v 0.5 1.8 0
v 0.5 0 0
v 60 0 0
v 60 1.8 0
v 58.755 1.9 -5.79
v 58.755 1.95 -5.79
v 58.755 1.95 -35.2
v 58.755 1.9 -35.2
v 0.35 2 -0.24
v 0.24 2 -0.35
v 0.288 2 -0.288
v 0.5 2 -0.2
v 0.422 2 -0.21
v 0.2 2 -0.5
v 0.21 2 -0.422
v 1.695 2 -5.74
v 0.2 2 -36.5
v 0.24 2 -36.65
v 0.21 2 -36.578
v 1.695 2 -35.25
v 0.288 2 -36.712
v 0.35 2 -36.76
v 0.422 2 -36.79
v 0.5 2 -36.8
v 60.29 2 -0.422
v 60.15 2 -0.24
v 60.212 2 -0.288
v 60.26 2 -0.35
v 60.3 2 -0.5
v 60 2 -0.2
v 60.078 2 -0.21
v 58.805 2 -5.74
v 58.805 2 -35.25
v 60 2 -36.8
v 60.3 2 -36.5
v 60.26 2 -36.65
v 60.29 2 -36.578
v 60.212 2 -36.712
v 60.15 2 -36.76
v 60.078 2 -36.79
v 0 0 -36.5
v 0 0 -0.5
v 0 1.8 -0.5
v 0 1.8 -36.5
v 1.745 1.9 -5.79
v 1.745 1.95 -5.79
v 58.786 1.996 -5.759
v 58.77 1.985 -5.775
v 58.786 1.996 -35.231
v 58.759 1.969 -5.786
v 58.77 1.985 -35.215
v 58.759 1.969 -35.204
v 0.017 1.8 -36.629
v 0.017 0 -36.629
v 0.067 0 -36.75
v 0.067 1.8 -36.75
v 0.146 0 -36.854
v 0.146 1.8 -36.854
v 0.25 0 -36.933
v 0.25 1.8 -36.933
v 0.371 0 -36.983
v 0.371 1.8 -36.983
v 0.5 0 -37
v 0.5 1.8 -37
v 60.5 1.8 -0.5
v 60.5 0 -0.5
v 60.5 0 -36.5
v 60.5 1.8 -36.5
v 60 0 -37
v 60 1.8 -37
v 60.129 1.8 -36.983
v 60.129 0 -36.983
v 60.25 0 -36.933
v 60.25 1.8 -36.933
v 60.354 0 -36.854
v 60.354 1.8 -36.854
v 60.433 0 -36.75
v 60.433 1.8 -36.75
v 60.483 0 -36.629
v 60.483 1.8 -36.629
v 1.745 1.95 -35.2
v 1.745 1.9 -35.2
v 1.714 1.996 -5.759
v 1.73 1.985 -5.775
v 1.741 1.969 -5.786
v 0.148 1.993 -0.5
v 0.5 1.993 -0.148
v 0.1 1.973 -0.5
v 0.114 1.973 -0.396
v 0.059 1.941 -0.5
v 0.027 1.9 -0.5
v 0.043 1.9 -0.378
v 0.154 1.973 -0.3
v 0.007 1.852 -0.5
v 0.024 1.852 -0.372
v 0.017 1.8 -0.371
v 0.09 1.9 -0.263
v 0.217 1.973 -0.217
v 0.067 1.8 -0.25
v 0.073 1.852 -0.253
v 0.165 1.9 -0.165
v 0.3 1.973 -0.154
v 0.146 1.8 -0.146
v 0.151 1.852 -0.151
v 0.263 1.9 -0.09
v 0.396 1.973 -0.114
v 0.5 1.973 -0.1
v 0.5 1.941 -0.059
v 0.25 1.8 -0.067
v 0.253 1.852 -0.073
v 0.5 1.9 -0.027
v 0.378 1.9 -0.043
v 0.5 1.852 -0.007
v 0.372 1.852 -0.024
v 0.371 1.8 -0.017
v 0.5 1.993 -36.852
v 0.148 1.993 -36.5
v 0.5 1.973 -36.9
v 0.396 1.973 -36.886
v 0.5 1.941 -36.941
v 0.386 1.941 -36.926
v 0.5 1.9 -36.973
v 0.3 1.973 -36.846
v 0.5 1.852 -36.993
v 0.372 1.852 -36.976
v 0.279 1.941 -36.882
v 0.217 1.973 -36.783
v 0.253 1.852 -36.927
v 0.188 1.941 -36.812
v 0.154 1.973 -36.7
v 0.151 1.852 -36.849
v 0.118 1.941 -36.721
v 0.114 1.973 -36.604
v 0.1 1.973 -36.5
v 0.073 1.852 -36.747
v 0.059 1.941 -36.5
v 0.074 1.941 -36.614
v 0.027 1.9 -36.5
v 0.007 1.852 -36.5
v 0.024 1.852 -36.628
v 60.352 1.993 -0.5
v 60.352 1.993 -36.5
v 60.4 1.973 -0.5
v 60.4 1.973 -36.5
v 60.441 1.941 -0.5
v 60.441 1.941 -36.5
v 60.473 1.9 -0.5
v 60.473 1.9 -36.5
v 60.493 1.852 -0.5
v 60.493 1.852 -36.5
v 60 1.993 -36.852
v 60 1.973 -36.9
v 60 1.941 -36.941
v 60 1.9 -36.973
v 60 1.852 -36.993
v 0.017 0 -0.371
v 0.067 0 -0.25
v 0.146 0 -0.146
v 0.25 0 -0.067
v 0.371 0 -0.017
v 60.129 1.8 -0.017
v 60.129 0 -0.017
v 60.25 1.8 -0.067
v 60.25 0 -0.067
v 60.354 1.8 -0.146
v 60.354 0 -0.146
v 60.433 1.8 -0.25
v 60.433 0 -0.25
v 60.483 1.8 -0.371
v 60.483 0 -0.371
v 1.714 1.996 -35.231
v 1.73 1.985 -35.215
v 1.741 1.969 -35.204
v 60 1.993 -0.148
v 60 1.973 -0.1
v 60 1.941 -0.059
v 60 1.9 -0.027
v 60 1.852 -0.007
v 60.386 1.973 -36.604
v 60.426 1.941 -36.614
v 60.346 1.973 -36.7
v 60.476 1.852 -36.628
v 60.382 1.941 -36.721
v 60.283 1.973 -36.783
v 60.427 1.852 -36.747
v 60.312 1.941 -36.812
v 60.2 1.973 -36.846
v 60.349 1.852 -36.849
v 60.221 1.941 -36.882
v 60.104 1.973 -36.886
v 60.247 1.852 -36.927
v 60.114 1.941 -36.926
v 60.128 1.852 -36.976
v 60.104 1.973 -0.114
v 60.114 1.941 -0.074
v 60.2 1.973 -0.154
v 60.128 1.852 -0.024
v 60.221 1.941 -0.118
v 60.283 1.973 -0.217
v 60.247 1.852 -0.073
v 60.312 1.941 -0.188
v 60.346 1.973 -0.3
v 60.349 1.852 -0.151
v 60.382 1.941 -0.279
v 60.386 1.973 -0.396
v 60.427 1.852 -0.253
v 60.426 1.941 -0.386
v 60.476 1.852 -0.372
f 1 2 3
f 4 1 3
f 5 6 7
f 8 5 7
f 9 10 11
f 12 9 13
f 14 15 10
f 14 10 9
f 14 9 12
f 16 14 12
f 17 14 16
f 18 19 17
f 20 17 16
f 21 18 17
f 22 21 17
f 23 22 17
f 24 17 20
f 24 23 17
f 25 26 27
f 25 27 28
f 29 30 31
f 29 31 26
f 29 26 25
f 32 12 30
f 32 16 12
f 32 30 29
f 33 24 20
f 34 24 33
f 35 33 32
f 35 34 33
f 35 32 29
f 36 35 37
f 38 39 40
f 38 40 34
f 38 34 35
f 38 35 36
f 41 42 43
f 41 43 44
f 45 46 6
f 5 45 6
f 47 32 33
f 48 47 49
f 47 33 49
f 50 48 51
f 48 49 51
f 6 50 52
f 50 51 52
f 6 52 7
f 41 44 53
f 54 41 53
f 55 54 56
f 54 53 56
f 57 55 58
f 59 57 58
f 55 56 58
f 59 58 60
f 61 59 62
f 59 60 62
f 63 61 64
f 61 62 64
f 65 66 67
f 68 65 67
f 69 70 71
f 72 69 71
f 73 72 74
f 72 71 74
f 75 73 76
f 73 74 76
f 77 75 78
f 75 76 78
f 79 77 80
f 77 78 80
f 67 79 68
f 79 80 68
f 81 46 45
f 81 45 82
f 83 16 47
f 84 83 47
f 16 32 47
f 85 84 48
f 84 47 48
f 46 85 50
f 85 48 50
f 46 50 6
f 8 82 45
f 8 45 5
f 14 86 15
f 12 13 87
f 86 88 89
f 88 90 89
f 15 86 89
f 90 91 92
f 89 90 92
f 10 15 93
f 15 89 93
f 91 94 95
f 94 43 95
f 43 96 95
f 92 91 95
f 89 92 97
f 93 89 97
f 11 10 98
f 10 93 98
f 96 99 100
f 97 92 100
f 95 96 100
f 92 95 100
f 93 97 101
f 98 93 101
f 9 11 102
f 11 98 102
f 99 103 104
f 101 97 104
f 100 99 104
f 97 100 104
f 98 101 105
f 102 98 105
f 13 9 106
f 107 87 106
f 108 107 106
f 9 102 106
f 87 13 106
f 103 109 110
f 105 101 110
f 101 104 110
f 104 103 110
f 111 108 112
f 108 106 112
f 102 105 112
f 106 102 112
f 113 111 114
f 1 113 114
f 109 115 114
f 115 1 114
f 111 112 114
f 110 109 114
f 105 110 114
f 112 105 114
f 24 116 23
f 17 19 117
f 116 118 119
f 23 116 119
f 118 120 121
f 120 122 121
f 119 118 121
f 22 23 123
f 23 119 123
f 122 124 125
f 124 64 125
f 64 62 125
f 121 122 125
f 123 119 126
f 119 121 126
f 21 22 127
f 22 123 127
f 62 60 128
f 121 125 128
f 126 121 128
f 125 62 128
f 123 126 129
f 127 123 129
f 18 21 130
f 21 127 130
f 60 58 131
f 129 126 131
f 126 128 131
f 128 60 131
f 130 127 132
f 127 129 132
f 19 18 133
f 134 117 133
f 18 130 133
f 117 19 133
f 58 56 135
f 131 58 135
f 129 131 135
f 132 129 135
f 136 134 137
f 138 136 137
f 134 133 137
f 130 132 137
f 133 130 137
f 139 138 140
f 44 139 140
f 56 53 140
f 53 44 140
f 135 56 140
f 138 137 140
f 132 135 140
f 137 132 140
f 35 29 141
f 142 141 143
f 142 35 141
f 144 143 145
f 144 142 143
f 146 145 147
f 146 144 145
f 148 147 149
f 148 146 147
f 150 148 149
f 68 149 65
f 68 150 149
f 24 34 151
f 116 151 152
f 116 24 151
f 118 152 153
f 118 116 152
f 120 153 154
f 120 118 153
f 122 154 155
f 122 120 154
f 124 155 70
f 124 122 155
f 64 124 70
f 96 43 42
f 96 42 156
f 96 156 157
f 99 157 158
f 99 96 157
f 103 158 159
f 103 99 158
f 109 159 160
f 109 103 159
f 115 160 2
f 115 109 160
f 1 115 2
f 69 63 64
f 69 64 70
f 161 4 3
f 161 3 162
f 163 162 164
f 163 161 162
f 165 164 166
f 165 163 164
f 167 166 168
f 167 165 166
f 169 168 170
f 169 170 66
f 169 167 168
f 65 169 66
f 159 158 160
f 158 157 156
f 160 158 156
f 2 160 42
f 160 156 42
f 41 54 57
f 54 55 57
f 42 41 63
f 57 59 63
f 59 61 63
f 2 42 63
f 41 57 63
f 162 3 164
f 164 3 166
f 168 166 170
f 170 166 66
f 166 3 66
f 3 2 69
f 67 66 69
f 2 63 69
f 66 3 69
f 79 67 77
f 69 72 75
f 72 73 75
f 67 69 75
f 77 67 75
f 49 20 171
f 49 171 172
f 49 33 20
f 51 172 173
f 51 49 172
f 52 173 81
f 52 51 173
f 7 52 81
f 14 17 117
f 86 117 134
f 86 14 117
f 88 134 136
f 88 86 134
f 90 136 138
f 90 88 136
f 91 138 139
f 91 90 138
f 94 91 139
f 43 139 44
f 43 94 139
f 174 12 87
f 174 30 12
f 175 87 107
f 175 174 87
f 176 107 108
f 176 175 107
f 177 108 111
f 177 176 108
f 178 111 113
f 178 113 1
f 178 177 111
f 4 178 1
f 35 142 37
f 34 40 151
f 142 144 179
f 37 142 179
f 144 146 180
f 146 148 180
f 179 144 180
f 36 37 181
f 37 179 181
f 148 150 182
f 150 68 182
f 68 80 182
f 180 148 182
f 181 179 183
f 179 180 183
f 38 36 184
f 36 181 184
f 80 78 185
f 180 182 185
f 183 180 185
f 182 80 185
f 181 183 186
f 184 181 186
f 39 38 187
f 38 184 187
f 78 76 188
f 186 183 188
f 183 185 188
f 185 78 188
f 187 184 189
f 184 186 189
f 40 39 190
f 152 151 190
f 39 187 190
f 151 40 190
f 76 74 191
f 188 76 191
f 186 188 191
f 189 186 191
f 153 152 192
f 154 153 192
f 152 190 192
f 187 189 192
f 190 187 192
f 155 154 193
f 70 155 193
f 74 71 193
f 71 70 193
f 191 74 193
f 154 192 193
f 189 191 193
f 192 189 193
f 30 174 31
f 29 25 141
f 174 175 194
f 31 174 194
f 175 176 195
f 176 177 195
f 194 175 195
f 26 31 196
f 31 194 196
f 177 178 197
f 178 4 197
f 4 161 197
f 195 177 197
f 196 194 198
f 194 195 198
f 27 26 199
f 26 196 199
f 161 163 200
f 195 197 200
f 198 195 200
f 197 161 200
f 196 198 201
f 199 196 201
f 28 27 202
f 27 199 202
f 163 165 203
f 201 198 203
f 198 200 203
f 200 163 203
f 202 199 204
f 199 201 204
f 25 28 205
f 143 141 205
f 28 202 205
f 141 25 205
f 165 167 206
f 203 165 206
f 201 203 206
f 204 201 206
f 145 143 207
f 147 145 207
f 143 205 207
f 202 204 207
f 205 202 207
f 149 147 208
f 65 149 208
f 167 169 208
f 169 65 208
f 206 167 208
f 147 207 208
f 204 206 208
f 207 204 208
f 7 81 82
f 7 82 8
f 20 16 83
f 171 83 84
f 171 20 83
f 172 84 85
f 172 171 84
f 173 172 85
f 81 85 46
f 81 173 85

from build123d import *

# Parameters (mm, degrees)
SKETCH1_W           = 60.5
SKETCH1_H           = 37
BOSS_EXTRUDE1_DEPTH = 2
SKETCH2_W           = 57.01
SKETCH2_H           = 29.41
CUT_EXTRUDE1_DEPTH  = 0.1
FILLET1_R           = 0.5
FILLET2_R           = 0.2
FILLET3_R           = 0.05


with BuildPart() as part:
    # Sketch1 → Boss-Extrude1 (new body)
    with BuildSketch(Plane(origin=(0, 0, 0), x_dir=(1, 0, 0), z_dir=(0, 1, 0))):
        with Locations((30.25, 18.5)):
            Rectangle(SKETCH1_W, SKETCH1_H)
    extrude(amount=BOSS_EXTRUDE1_DEPTH)

    # Sketch2 → Cut-Extrude1 (cut)
    with BuildSketch(Plane(origin=(0, 2, 0), x_dir=(1, 0, 0), z_dir=(0, 1, 0))):
        with Locations((30.25, 20.495)):
            Rectangle(SKETCH2_W, SKETCH2_H)
    extrude(amount=-CUT_EXTRUDE1_DEPTH, mode=Mode.SUBTRACT)

    # Fillet1
    fillet1_edges = [part.edges().sort_by_distance(p)[0] for p in [
        (0, 1, 0),
        (60.5, 1, 0),
        (60.5, 1, -37),
        (0, 1, -37),
    ]]
    fillet(fillet1_edges, radius=FILLET1_R)

    # Fillet2
    fillet2_edges = [part.edges().sort_by_distance(p)[0] for p in [
        (30.25, 2, 0),
        (0, 2, -18.5),
        (60.5, 2, -18.5),
        (30.25, 2, -37),
        (0.146446609, 2, -36.853553391),
        (60.353553391, 2, -36.853553391),
        (60.353553391, 2, -0.146446609),
        (0.146446609, 2, -0.146446609),
    ]]
    fillet(fillet2_edges, radius=FILLET2_R)

    # Fillet3
    fillet3_edges = [part.edges().sort_by_distance(p)[0] for p in [
        (1.745, 2, -20.495),
        (30.25, 2, -5.79),
        (58.755, 2, -20.495),
        (30.25, 2, -35.2),
    ]]
    fillet(fillet3_edges, radius=FILLET3_R)


solid = part.part
